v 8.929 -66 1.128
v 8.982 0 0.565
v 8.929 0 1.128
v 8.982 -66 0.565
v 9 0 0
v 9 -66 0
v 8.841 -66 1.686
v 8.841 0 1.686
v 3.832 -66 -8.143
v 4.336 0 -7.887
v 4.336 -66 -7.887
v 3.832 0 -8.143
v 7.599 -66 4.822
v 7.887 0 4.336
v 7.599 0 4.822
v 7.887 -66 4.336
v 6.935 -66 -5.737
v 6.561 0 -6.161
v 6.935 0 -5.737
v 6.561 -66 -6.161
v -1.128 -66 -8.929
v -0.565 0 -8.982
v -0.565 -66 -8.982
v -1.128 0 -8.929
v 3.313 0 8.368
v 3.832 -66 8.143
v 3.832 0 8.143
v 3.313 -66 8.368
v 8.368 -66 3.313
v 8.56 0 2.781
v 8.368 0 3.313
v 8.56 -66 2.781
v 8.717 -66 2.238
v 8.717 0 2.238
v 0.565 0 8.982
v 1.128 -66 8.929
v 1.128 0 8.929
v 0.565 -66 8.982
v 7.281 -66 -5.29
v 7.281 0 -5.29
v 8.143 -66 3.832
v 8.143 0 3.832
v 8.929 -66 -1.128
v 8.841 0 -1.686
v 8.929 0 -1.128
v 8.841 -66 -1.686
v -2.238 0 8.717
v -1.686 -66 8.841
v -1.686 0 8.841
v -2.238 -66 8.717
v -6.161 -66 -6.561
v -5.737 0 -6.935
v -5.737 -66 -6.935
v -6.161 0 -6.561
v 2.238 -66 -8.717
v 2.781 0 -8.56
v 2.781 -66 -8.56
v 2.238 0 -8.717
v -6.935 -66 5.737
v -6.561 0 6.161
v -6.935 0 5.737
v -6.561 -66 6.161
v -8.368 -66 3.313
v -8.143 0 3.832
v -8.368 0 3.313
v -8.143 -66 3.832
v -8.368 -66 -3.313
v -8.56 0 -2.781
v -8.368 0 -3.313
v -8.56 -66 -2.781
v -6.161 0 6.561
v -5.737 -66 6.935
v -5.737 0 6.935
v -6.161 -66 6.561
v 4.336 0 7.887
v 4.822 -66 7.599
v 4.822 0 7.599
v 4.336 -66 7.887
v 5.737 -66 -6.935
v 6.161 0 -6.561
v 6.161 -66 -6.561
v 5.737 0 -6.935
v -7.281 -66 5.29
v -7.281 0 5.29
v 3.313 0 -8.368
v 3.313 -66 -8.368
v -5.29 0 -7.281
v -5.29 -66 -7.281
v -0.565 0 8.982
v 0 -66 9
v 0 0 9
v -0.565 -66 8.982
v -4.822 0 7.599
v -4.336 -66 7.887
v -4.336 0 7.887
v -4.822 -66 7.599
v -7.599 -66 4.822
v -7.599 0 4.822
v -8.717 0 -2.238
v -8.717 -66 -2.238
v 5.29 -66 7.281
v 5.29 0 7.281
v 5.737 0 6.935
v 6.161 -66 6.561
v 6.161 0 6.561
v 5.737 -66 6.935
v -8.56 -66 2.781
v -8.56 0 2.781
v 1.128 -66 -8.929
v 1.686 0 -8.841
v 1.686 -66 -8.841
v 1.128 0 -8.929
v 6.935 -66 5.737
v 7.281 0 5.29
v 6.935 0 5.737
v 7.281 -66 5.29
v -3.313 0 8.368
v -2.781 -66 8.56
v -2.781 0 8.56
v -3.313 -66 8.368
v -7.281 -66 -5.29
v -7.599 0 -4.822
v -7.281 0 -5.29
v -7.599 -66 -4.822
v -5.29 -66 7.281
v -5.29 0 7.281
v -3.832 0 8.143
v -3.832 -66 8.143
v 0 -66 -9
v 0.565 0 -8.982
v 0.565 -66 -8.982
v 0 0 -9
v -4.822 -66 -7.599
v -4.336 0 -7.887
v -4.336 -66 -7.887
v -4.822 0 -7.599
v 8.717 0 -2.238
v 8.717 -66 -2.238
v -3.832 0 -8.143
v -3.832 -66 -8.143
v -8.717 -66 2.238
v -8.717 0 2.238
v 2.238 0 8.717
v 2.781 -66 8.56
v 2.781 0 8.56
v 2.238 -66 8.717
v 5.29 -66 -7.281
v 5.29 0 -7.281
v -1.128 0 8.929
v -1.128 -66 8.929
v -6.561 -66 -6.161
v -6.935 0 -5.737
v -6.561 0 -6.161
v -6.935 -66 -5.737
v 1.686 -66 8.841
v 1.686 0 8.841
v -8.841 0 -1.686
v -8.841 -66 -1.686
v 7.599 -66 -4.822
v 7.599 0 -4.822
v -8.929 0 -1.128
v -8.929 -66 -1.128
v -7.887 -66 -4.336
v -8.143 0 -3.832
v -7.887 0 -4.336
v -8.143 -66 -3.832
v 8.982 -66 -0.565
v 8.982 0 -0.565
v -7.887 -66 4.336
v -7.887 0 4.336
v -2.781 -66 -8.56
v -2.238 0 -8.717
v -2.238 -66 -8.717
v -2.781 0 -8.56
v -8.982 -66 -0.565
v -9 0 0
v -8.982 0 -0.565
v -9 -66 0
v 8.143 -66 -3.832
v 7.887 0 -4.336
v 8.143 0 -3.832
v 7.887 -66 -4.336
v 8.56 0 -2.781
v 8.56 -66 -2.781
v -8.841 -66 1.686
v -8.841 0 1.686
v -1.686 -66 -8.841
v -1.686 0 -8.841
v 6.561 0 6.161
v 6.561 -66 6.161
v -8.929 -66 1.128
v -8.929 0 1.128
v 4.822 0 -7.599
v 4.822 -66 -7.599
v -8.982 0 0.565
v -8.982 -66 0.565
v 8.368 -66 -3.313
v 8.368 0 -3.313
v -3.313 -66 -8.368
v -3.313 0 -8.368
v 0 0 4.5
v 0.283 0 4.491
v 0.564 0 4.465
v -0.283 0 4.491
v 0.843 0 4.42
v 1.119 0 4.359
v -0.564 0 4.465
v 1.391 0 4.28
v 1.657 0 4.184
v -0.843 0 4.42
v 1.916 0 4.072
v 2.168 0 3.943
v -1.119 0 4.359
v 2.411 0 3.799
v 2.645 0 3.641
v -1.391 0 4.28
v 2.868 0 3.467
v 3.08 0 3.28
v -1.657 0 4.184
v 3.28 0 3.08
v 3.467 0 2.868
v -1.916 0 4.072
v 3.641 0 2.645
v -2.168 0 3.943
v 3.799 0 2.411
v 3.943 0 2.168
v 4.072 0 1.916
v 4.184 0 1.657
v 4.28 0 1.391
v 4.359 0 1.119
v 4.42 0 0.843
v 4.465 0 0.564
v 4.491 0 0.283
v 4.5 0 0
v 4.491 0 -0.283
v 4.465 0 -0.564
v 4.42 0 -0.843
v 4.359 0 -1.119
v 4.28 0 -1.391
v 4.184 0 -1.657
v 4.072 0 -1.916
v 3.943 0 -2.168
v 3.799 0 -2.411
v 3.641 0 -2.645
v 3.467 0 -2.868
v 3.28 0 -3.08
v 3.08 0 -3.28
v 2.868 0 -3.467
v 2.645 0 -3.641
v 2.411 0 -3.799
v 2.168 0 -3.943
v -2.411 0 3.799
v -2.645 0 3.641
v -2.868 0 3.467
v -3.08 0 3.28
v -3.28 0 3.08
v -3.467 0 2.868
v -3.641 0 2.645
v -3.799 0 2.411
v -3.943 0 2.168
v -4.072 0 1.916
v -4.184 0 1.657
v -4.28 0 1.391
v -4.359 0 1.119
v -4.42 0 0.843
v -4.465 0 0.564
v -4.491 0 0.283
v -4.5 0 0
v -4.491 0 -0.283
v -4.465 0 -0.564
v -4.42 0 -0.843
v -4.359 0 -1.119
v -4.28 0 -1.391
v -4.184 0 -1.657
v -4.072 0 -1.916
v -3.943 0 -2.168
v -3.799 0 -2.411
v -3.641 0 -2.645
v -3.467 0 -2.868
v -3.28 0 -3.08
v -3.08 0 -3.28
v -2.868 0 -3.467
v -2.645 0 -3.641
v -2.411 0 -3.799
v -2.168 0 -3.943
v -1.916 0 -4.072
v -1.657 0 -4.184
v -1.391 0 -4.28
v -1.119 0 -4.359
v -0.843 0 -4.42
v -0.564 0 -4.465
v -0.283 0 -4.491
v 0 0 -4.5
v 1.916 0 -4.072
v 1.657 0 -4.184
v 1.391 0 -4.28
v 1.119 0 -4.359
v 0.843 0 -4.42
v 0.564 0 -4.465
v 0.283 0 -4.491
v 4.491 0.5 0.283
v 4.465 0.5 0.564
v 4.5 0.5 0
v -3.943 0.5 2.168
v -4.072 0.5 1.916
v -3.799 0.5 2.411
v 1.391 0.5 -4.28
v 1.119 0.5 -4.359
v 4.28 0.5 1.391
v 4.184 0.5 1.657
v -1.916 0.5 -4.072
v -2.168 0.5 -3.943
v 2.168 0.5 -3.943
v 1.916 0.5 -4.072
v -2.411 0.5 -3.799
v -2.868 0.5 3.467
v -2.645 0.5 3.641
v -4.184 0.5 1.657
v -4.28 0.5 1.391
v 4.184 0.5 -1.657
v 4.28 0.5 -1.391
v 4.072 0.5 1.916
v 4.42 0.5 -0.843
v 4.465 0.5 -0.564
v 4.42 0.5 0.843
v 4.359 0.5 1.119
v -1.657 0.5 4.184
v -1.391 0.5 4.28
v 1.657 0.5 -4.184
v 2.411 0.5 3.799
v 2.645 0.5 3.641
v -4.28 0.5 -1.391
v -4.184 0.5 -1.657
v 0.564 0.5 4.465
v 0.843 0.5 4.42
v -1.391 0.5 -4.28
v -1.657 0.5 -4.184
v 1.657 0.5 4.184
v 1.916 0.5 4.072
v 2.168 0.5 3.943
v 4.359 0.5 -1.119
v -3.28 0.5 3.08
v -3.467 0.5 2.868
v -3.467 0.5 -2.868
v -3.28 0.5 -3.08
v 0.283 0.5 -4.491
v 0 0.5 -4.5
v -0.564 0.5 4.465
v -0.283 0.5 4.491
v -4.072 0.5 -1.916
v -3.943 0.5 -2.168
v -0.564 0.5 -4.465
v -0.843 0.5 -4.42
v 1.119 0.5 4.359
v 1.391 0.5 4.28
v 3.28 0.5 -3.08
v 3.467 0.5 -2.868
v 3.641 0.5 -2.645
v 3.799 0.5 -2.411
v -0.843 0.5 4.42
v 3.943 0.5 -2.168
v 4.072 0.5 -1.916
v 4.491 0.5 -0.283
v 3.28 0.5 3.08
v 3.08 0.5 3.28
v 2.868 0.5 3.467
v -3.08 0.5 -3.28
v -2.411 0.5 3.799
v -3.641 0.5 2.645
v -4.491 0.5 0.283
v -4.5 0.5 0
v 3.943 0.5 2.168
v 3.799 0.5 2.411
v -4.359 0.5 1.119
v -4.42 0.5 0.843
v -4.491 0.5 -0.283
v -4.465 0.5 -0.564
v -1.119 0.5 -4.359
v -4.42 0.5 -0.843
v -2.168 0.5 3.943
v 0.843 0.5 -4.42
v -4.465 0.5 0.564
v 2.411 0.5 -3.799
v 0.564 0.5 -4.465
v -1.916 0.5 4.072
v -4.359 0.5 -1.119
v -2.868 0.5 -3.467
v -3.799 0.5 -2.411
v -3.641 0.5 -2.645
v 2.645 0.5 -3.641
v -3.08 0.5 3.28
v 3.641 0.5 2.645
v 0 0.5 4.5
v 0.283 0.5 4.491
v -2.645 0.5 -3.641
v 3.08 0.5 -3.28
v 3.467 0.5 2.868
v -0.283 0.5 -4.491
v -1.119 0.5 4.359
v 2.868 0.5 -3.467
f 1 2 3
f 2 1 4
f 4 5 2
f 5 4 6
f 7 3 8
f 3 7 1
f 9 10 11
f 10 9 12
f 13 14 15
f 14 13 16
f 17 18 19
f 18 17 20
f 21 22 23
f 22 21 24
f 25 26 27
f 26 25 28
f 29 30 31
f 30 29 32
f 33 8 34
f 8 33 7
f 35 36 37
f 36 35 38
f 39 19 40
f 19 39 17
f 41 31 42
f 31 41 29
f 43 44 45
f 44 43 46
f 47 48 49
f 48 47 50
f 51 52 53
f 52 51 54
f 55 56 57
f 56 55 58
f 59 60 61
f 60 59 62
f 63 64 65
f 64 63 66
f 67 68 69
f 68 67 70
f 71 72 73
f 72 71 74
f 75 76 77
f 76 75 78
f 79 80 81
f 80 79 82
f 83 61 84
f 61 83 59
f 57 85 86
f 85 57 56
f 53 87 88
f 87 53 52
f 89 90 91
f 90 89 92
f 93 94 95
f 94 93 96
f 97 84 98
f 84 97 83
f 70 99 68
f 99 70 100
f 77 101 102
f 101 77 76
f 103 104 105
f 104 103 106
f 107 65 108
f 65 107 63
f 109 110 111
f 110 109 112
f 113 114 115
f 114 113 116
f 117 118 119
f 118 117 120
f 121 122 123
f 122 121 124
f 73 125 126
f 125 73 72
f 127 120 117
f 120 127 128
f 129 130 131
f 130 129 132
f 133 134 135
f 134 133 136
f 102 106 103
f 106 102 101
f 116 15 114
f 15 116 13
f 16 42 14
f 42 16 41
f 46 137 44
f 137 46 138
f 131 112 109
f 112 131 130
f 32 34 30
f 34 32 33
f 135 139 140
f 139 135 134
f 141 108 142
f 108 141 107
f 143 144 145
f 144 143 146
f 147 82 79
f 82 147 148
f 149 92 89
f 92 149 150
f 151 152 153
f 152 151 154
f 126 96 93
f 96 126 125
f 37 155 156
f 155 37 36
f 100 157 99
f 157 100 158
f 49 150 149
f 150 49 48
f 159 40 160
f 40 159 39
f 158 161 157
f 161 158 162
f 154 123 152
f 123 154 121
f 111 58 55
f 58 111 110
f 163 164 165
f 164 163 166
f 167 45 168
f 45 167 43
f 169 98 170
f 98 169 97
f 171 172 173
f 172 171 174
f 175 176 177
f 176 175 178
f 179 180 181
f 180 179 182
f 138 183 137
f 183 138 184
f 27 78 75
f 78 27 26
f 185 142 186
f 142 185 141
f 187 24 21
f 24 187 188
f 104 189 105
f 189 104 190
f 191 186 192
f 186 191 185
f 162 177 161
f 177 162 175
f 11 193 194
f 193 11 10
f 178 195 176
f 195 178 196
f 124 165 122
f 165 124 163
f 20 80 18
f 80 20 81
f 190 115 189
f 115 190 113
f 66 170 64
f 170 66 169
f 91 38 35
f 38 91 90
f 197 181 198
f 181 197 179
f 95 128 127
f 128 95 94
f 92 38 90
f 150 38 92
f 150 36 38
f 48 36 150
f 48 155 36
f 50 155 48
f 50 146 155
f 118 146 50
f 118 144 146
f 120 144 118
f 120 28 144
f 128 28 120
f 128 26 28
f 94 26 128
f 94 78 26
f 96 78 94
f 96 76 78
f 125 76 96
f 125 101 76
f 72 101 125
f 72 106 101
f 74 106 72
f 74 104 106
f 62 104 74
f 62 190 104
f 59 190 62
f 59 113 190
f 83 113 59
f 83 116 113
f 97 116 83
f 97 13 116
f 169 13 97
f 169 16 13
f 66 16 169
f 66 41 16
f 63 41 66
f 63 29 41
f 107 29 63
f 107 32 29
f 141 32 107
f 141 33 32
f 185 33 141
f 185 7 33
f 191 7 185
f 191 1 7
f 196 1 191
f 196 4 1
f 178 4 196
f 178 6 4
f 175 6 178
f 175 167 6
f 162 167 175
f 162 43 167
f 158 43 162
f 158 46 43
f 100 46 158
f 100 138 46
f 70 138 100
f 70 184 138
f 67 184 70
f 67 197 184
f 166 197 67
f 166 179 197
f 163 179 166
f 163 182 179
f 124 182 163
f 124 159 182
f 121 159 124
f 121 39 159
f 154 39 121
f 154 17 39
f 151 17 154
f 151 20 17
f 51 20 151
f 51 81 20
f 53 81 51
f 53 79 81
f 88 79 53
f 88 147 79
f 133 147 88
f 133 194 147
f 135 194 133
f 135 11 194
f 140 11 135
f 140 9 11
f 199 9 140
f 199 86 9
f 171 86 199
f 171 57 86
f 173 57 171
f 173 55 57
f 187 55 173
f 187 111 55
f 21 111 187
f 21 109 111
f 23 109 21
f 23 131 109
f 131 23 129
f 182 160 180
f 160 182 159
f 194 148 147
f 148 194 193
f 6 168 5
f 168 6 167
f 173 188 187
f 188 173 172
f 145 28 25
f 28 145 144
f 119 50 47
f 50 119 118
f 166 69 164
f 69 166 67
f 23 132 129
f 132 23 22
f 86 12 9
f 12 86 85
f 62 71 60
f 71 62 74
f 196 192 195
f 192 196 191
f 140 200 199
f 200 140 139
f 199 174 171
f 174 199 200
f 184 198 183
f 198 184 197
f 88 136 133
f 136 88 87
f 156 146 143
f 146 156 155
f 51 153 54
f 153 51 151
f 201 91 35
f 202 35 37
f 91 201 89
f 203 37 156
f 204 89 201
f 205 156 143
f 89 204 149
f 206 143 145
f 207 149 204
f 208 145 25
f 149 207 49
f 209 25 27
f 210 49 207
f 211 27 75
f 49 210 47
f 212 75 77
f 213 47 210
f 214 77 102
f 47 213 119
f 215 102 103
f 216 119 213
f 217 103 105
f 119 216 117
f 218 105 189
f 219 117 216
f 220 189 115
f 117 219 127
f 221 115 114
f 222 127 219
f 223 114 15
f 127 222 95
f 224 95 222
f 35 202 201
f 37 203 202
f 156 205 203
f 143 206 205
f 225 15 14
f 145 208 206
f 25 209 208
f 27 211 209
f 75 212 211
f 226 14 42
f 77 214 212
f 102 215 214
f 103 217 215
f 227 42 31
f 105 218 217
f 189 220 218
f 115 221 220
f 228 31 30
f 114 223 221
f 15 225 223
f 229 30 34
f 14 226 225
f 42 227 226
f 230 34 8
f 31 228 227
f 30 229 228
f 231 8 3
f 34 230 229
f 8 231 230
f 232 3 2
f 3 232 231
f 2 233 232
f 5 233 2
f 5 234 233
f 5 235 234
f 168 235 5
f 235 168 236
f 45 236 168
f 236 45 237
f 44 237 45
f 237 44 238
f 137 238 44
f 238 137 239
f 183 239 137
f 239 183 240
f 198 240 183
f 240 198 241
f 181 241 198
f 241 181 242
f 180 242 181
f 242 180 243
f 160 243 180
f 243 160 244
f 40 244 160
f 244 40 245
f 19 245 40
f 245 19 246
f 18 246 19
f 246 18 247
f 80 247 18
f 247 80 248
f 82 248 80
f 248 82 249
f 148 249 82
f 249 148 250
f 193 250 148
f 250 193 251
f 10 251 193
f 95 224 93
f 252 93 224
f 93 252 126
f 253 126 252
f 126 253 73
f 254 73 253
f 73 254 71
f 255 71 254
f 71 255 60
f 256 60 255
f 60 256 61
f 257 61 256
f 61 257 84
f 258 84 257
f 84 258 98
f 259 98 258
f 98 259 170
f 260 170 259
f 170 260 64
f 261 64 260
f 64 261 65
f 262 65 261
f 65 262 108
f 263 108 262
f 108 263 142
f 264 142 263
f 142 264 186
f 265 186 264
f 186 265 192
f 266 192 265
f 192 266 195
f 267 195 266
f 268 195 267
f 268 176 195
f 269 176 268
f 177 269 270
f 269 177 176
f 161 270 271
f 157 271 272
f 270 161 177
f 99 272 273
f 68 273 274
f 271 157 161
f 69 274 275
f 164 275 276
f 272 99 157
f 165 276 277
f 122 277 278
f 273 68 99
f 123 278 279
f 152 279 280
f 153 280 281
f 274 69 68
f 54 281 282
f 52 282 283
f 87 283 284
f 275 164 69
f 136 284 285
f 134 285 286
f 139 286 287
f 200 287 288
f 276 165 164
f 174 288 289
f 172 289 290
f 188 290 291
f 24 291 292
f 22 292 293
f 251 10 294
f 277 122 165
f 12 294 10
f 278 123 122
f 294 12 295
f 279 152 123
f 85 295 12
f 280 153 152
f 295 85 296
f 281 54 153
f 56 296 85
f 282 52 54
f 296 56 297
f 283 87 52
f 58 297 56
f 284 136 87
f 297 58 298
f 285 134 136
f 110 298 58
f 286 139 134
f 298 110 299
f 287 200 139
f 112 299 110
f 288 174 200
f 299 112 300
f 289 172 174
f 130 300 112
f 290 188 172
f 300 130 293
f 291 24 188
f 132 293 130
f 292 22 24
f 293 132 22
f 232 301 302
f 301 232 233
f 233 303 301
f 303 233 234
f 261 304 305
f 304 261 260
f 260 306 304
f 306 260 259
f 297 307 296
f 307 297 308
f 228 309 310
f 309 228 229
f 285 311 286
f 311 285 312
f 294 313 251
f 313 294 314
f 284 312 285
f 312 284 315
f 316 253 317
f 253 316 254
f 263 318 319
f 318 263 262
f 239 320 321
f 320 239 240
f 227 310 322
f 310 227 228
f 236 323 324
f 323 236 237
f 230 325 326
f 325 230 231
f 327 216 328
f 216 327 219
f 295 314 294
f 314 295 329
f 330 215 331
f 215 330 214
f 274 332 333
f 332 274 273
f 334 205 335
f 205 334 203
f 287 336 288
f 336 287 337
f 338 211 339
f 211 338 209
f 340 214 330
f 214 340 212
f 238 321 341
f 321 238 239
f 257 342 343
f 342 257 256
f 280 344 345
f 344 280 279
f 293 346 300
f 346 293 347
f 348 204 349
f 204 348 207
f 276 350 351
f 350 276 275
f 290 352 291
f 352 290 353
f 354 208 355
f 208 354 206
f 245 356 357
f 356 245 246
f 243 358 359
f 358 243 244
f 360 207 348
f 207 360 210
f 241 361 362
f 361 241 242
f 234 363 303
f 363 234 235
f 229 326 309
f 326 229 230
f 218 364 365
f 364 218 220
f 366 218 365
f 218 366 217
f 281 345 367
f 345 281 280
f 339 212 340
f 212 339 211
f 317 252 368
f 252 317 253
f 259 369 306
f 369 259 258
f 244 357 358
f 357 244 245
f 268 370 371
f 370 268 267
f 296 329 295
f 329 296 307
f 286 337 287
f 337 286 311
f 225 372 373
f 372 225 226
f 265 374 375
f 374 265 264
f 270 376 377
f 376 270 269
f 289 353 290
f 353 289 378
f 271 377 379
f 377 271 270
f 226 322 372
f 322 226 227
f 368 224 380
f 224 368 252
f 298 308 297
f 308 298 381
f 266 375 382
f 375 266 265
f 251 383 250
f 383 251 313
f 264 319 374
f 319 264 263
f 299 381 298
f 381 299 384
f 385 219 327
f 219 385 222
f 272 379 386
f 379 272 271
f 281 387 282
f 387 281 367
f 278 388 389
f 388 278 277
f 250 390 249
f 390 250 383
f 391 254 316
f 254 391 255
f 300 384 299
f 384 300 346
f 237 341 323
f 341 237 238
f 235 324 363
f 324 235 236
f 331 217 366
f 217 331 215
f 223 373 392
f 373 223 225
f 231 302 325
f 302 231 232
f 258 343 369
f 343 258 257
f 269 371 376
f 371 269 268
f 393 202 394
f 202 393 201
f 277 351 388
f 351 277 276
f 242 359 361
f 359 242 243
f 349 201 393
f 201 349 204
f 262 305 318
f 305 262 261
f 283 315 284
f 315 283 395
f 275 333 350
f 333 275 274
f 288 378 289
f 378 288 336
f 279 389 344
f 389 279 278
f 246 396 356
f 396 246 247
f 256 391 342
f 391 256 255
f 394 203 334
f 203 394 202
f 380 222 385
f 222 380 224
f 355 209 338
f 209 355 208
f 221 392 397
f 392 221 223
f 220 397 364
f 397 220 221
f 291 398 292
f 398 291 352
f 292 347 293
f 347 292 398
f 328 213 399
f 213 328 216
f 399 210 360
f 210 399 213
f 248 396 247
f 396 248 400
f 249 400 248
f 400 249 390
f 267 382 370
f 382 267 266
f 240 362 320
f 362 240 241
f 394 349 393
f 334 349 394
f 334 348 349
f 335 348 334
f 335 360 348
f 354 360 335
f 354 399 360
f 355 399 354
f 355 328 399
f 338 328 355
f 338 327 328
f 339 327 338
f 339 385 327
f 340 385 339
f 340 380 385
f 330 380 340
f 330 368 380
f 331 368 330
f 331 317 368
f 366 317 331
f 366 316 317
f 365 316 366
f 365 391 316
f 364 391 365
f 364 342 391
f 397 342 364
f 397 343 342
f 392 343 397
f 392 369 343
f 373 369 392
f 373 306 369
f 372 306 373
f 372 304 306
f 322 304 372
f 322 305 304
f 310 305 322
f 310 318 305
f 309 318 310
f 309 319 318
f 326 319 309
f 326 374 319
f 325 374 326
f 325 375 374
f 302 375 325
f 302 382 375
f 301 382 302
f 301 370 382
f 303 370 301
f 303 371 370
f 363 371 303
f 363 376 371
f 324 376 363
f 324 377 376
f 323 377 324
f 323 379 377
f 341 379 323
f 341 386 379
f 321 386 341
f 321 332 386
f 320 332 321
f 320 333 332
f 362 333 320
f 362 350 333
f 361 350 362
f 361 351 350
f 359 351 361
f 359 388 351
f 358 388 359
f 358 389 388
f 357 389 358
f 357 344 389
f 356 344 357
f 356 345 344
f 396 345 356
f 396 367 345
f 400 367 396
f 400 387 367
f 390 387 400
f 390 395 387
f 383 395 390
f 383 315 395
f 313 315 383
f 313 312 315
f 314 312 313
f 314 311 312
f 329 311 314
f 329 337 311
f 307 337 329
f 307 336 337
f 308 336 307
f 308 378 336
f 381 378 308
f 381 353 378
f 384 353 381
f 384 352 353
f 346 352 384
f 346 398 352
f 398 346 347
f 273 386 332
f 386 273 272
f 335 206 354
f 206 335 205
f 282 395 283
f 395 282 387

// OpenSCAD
module model()
{
    rotate([90, 0, 0])  union()
    {
       rotate([0, 0, 0])  translate([0, 0, 0])  cylinder(66, 9,9, $fn=100);
       rotate([0, 0, 0])  translate([0, 0, -0.5])  cylinder(0.5, 4.5,4.5, $fn=100);
      }
}


translate([0,0,0])model();
   
